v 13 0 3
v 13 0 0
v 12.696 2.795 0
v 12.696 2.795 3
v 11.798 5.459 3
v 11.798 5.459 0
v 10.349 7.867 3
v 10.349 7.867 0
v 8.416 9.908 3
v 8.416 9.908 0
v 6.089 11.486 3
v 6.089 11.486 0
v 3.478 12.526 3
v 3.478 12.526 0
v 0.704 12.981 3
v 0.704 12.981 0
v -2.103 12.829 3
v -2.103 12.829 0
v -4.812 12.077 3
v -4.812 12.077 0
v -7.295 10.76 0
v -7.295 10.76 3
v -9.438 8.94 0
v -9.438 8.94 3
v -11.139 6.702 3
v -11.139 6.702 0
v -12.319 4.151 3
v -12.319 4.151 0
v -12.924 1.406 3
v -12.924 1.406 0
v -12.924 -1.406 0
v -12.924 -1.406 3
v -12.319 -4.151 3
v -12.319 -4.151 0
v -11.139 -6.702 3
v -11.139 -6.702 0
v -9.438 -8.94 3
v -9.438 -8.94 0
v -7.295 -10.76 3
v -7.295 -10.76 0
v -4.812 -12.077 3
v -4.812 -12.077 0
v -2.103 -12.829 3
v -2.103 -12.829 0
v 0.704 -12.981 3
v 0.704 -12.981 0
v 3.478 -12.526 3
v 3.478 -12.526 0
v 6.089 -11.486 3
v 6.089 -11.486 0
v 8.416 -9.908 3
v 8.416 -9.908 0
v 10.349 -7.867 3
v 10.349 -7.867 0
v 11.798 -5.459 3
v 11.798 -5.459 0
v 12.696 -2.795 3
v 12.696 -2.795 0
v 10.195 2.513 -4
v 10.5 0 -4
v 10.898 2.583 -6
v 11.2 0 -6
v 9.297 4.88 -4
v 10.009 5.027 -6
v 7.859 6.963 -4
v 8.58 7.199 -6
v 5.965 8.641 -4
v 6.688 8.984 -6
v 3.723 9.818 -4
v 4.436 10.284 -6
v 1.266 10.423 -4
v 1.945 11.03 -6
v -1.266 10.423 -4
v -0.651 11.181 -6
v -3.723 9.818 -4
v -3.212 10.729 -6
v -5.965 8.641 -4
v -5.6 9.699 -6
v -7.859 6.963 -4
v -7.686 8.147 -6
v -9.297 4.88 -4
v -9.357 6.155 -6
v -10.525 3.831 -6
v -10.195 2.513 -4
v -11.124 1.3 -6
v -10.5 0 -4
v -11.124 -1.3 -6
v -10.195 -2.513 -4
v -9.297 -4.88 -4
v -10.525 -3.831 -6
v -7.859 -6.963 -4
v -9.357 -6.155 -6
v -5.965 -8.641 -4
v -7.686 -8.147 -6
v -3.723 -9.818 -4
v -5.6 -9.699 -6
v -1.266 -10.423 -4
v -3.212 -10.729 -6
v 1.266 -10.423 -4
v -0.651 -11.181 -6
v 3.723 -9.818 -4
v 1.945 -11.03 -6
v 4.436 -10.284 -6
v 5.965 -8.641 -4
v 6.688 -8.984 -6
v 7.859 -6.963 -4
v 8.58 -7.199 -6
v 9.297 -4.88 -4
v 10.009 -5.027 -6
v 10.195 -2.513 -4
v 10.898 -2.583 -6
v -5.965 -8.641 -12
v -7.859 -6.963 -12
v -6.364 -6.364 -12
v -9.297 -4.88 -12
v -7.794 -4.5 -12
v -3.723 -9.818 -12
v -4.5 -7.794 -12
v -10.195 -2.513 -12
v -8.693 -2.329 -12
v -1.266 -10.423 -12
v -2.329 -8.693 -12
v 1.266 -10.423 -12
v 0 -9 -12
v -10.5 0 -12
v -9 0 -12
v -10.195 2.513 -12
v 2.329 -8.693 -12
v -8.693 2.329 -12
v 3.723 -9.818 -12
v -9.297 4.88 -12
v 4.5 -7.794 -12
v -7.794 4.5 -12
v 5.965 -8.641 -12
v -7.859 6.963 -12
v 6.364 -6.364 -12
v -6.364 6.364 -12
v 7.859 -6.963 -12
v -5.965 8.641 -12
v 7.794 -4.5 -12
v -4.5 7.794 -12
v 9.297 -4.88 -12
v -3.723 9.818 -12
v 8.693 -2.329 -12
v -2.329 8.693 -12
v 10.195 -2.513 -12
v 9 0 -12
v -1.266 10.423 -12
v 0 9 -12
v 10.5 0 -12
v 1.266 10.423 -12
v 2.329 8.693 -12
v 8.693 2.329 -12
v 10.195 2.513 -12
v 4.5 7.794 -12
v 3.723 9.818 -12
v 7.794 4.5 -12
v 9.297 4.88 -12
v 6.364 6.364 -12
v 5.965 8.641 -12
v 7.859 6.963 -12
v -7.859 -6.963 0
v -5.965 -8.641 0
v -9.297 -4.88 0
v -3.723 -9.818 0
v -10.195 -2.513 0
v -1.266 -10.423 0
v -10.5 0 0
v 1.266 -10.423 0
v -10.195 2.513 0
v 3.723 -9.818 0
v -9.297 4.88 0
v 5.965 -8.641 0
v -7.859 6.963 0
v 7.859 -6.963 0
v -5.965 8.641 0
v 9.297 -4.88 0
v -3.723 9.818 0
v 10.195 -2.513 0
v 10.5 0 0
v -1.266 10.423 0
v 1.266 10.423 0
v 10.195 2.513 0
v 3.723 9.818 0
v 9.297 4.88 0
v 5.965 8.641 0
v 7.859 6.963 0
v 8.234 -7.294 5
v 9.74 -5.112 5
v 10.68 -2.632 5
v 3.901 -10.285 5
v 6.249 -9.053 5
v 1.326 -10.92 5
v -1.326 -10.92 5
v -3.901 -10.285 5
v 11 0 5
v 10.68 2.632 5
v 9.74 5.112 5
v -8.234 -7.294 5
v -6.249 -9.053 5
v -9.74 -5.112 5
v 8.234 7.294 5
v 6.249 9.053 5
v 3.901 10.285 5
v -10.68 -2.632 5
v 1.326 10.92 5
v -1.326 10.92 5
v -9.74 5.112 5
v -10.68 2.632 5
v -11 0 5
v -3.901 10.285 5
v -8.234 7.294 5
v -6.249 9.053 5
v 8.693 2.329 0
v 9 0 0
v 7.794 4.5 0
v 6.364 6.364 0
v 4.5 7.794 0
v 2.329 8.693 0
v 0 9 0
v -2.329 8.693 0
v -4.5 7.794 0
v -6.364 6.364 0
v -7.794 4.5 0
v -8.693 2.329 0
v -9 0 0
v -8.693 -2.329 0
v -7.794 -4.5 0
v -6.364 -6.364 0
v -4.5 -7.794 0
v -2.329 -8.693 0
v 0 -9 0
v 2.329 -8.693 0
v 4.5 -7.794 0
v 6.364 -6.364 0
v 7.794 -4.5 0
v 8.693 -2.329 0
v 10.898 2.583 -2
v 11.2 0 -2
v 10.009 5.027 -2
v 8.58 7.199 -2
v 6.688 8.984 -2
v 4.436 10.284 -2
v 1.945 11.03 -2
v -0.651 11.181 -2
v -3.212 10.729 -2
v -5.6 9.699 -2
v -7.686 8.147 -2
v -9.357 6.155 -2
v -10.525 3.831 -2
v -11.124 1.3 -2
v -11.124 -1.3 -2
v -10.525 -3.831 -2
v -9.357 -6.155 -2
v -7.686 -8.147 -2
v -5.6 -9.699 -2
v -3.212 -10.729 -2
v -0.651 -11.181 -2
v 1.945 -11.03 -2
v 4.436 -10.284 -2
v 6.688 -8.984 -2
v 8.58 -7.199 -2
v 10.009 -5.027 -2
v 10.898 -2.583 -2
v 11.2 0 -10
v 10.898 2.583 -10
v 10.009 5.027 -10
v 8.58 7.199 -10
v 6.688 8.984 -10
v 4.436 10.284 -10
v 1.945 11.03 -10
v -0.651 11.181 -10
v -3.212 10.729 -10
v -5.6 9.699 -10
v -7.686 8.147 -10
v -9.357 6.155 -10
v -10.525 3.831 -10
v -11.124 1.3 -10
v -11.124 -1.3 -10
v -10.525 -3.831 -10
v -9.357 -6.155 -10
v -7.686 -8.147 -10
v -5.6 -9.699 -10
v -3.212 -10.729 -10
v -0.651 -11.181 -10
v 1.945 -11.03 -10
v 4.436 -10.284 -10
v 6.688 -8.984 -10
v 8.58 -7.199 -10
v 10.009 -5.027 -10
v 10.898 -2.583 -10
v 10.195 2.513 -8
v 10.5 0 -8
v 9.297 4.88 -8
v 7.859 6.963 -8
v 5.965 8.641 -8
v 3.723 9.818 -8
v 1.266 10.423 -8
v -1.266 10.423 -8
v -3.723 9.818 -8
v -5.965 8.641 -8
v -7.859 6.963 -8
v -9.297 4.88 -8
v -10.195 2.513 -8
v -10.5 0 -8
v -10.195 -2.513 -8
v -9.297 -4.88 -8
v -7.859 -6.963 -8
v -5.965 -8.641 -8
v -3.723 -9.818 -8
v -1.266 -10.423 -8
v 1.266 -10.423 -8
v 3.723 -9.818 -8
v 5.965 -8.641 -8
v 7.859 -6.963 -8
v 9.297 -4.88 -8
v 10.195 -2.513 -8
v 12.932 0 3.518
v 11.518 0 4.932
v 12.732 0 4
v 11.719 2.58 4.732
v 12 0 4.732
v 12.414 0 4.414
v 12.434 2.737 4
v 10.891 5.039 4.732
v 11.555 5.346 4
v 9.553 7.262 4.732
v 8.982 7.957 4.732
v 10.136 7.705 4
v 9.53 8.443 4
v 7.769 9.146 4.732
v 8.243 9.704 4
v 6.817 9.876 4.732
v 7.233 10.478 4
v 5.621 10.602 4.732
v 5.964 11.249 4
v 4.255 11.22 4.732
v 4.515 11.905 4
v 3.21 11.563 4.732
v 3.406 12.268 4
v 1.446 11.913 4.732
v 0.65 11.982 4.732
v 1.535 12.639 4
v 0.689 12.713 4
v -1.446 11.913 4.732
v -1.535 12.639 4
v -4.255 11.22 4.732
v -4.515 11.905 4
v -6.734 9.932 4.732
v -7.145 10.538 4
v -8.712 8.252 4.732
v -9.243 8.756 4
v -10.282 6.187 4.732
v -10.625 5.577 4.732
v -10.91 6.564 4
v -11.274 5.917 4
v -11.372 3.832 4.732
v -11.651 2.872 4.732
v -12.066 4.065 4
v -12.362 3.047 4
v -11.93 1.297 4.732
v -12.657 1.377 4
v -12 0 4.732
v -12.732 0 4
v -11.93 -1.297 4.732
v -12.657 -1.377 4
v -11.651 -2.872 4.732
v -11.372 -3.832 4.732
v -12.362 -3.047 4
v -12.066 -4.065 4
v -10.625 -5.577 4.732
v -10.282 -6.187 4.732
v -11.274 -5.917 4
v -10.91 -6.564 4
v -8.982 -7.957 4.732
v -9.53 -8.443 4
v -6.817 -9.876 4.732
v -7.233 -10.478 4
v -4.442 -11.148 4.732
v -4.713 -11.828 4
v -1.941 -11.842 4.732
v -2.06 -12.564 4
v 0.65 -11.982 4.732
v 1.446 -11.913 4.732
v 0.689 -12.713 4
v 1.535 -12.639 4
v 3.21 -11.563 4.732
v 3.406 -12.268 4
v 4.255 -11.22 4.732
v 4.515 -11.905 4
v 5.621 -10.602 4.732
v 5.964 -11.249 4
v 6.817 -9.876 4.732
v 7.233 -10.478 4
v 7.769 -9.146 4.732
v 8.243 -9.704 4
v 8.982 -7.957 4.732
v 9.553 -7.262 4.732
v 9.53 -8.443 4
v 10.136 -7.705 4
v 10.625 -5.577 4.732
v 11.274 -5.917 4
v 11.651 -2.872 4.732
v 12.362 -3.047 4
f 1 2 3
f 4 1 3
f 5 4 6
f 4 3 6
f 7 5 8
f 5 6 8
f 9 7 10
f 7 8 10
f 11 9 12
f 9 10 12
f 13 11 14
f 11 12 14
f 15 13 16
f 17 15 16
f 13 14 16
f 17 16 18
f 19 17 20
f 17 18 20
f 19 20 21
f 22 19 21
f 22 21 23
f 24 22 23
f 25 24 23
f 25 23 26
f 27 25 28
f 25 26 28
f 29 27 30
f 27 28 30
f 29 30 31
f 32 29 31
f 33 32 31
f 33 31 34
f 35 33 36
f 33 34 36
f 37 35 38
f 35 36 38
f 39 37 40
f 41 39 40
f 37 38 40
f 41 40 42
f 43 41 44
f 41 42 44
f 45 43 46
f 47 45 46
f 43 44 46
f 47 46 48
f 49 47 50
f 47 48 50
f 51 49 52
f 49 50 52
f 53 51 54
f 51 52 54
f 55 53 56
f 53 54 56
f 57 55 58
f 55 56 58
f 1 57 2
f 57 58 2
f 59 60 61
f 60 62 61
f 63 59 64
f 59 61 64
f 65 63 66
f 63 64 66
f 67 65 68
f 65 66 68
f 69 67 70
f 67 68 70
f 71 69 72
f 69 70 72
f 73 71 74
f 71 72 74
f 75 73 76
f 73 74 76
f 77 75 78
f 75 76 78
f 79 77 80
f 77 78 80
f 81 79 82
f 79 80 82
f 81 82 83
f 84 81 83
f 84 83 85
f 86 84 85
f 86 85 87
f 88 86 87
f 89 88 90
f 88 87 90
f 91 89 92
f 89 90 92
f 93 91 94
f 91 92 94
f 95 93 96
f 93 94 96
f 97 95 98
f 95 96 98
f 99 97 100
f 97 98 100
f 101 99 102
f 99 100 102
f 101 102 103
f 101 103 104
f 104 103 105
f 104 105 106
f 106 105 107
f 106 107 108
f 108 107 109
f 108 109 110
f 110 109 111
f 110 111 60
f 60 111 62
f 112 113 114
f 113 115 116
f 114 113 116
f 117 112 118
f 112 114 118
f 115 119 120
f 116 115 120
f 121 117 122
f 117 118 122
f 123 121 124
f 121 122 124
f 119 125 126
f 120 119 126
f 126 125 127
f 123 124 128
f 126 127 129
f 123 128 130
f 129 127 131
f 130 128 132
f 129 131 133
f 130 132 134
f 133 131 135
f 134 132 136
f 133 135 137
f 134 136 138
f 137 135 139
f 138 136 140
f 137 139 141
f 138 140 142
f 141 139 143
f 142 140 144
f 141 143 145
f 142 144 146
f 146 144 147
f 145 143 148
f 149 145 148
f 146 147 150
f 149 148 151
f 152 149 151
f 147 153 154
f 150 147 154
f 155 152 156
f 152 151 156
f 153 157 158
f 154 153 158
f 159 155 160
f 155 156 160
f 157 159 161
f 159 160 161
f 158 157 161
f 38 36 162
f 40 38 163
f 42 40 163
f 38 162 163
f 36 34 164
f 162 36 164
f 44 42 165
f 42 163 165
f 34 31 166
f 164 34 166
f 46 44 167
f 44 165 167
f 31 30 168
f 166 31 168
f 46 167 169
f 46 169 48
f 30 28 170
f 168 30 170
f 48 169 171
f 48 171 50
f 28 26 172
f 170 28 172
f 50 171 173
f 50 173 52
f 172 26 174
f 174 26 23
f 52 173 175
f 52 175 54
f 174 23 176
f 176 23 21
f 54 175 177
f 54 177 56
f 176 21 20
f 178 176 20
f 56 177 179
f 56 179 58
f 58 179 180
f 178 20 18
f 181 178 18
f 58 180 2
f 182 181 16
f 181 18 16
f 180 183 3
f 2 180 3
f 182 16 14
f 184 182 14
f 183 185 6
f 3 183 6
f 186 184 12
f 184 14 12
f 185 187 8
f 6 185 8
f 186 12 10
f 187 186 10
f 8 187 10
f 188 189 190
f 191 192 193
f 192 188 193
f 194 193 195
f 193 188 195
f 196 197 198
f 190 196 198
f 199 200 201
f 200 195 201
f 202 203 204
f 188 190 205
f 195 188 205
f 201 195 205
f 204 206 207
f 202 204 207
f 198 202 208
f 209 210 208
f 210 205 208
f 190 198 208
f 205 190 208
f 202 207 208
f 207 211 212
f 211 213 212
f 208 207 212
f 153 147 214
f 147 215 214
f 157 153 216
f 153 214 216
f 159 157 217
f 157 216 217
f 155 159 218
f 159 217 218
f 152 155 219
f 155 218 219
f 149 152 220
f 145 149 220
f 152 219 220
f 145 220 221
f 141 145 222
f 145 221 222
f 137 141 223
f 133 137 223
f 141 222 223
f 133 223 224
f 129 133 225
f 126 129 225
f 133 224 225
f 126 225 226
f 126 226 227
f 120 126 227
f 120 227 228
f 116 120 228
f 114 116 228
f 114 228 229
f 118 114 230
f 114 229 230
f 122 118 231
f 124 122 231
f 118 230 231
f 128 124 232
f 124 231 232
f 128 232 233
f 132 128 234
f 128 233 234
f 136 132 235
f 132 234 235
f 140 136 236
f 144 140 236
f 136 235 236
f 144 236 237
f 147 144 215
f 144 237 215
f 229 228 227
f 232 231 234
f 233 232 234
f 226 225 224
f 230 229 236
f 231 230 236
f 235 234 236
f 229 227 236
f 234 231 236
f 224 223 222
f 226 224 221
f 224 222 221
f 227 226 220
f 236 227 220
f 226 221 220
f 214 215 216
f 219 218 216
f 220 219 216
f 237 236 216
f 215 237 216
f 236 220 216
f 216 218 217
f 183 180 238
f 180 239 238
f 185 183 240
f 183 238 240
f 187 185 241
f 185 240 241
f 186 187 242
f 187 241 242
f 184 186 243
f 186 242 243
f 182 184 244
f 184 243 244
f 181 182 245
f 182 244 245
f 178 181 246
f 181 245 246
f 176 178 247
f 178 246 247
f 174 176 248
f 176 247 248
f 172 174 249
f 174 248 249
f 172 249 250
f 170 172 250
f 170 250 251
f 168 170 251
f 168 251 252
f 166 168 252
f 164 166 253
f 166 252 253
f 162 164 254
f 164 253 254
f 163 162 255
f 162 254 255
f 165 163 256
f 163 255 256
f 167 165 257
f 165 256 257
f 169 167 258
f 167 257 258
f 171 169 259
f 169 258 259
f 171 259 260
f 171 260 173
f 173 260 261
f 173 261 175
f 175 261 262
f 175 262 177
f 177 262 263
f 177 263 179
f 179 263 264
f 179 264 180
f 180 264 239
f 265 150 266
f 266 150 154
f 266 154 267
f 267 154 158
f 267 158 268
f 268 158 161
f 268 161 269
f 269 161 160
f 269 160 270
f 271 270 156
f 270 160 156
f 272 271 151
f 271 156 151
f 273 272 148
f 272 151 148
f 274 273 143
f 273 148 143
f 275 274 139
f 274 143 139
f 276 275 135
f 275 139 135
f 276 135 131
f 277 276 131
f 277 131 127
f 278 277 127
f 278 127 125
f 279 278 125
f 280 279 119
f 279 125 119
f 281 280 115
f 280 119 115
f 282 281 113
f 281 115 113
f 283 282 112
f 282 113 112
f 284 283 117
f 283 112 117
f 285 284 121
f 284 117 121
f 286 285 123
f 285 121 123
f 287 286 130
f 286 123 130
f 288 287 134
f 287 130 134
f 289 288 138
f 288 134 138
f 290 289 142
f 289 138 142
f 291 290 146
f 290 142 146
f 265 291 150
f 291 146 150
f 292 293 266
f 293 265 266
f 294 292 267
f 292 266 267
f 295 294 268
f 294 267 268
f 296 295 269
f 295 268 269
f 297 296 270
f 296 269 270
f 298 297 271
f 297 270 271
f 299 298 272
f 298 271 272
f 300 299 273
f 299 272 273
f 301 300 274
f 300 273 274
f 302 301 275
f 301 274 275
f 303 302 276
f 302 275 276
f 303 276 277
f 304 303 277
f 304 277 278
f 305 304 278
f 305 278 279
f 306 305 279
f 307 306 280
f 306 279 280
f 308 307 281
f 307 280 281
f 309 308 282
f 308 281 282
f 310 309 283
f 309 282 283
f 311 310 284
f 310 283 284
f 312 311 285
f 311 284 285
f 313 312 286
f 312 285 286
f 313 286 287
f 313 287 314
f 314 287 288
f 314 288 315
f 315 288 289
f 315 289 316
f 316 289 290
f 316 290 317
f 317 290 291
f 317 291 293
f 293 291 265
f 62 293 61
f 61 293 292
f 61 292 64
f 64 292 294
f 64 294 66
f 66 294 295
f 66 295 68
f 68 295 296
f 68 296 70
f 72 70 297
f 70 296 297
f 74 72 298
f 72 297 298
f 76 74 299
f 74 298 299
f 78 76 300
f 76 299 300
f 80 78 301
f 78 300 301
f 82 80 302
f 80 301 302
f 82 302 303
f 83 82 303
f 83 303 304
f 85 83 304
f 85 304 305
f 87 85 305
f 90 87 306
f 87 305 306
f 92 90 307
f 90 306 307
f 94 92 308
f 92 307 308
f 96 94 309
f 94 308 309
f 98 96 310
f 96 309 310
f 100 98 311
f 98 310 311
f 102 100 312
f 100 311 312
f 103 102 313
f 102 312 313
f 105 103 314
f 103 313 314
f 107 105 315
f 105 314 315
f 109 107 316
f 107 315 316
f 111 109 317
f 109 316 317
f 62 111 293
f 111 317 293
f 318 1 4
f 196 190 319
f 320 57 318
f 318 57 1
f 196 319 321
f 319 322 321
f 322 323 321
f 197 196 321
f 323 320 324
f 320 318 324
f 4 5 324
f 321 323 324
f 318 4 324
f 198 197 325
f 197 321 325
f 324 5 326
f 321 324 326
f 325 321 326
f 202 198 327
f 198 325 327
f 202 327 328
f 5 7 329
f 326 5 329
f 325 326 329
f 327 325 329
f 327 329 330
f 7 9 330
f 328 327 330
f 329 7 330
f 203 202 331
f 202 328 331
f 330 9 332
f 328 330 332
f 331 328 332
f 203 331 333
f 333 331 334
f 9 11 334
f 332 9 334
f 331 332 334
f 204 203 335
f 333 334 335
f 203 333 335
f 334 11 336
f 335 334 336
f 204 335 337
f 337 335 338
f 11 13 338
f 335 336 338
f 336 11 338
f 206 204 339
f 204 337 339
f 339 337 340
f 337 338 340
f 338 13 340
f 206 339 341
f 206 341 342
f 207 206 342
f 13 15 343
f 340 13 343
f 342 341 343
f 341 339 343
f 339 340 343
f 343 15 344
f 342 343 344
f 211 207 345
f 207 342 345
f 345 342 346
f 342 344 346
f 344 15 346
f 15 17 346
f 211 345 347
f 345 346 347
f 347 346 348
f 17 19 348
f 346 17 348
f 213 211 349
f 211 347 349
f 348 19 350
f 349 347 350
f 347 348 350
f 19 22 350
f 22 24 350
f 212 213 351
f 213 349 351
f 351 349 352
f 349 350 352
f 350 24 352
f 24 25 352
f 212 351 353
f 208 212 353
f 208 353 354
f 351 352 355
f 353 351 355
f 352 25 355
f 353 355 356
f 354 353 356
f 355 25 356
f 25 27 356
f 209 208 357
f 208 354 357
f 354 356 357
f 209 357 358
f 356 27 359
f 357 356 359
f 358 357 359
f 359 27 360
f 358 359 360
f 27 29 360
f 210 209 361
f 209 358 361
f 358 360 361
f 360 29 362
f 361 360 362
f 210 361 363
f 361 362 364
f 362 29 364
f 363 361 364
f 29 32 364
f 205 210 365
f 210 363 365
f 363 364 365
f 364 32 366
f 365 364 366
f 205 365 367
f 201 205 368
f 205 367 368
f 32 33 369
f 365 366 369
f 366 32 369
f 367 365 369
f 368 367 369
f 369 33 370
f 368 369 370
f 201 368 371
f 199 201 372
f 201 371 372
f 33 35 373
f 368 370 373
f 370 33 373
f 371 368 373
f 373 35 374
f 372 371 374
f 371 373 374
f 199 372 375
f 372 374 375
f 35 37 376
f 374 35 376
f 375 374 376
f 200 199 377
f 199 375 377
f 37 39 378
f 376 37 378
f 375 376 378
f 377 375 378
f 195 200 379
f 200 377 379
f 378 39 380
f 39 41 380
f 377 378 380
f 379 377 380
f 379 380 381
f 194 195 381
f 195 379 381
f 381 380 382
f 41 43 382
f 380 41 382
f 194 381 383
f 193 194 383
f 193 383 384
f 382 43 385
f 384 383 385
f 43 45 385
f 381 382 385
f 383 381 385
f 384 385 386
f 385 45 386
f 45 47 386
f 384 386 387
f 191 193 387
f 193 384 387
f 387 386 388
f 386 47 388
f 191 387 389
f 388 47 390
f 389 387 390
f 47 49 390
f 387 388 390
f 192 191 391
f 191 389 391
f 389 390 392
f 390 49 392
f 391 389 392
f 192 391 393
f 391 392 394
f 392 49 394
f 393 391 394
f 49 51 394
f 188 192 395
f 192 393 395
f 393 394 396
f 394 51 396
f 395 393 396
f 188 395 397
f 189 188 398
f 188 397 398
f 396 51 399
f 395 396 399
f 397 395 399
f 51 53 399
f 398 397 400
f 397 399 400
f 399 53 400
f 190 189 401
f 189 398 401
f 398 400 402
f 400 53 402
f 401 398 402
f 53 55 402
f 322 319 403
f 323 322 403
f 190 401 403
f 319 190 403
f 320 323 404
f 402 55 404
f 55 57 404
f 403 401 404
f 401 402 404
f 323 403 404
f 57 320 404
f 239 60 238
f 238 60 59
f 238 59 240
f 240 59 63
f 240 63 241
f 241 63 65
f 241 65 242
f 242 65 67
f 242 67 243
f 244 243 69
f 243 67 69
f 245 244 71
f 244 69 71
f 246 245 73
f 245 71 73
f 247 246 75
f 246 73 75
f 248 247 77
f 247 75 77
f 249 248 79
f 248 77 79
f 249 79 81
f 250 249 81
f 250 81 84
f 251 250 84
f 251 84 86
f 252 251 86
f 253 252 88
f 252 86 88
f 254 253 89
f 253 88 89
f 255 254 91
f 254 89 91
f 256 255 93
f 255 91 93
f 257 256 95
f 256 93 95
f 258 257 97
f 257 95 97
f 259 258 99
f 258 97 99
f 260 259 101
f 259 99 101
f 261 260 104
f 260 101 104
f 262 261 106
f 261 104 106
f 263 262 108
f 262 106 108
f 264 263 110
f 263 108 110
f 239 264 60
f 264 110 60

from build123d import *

# Parameters (mm, degrees)
FILLET_R = 2


with BuildPart() as part:
    # Sketch → Revolution (revolve)
    with BuildSketch(Plane.XZ):
        Polygon((0, 5), (13, 5), (13, 0), (10.5, 0), (11.2, -2), (10.5, -4), (11.2, -6), (10.5, -8), (11.2, -10), (10.5, -12), (9, -12), (9, 0), (0, 0), align=None)
    revolve(axis=Axis((0, 0, 0), (0, 0, 1)))

    # Fillet
    fillet_edges = [part.edges().sort_by_distance(p)[0] for p in [
        (-13, 0, 5),
    ]]
    fillet(fillet_edges, radius=FILLET_R)


solid = part.part
